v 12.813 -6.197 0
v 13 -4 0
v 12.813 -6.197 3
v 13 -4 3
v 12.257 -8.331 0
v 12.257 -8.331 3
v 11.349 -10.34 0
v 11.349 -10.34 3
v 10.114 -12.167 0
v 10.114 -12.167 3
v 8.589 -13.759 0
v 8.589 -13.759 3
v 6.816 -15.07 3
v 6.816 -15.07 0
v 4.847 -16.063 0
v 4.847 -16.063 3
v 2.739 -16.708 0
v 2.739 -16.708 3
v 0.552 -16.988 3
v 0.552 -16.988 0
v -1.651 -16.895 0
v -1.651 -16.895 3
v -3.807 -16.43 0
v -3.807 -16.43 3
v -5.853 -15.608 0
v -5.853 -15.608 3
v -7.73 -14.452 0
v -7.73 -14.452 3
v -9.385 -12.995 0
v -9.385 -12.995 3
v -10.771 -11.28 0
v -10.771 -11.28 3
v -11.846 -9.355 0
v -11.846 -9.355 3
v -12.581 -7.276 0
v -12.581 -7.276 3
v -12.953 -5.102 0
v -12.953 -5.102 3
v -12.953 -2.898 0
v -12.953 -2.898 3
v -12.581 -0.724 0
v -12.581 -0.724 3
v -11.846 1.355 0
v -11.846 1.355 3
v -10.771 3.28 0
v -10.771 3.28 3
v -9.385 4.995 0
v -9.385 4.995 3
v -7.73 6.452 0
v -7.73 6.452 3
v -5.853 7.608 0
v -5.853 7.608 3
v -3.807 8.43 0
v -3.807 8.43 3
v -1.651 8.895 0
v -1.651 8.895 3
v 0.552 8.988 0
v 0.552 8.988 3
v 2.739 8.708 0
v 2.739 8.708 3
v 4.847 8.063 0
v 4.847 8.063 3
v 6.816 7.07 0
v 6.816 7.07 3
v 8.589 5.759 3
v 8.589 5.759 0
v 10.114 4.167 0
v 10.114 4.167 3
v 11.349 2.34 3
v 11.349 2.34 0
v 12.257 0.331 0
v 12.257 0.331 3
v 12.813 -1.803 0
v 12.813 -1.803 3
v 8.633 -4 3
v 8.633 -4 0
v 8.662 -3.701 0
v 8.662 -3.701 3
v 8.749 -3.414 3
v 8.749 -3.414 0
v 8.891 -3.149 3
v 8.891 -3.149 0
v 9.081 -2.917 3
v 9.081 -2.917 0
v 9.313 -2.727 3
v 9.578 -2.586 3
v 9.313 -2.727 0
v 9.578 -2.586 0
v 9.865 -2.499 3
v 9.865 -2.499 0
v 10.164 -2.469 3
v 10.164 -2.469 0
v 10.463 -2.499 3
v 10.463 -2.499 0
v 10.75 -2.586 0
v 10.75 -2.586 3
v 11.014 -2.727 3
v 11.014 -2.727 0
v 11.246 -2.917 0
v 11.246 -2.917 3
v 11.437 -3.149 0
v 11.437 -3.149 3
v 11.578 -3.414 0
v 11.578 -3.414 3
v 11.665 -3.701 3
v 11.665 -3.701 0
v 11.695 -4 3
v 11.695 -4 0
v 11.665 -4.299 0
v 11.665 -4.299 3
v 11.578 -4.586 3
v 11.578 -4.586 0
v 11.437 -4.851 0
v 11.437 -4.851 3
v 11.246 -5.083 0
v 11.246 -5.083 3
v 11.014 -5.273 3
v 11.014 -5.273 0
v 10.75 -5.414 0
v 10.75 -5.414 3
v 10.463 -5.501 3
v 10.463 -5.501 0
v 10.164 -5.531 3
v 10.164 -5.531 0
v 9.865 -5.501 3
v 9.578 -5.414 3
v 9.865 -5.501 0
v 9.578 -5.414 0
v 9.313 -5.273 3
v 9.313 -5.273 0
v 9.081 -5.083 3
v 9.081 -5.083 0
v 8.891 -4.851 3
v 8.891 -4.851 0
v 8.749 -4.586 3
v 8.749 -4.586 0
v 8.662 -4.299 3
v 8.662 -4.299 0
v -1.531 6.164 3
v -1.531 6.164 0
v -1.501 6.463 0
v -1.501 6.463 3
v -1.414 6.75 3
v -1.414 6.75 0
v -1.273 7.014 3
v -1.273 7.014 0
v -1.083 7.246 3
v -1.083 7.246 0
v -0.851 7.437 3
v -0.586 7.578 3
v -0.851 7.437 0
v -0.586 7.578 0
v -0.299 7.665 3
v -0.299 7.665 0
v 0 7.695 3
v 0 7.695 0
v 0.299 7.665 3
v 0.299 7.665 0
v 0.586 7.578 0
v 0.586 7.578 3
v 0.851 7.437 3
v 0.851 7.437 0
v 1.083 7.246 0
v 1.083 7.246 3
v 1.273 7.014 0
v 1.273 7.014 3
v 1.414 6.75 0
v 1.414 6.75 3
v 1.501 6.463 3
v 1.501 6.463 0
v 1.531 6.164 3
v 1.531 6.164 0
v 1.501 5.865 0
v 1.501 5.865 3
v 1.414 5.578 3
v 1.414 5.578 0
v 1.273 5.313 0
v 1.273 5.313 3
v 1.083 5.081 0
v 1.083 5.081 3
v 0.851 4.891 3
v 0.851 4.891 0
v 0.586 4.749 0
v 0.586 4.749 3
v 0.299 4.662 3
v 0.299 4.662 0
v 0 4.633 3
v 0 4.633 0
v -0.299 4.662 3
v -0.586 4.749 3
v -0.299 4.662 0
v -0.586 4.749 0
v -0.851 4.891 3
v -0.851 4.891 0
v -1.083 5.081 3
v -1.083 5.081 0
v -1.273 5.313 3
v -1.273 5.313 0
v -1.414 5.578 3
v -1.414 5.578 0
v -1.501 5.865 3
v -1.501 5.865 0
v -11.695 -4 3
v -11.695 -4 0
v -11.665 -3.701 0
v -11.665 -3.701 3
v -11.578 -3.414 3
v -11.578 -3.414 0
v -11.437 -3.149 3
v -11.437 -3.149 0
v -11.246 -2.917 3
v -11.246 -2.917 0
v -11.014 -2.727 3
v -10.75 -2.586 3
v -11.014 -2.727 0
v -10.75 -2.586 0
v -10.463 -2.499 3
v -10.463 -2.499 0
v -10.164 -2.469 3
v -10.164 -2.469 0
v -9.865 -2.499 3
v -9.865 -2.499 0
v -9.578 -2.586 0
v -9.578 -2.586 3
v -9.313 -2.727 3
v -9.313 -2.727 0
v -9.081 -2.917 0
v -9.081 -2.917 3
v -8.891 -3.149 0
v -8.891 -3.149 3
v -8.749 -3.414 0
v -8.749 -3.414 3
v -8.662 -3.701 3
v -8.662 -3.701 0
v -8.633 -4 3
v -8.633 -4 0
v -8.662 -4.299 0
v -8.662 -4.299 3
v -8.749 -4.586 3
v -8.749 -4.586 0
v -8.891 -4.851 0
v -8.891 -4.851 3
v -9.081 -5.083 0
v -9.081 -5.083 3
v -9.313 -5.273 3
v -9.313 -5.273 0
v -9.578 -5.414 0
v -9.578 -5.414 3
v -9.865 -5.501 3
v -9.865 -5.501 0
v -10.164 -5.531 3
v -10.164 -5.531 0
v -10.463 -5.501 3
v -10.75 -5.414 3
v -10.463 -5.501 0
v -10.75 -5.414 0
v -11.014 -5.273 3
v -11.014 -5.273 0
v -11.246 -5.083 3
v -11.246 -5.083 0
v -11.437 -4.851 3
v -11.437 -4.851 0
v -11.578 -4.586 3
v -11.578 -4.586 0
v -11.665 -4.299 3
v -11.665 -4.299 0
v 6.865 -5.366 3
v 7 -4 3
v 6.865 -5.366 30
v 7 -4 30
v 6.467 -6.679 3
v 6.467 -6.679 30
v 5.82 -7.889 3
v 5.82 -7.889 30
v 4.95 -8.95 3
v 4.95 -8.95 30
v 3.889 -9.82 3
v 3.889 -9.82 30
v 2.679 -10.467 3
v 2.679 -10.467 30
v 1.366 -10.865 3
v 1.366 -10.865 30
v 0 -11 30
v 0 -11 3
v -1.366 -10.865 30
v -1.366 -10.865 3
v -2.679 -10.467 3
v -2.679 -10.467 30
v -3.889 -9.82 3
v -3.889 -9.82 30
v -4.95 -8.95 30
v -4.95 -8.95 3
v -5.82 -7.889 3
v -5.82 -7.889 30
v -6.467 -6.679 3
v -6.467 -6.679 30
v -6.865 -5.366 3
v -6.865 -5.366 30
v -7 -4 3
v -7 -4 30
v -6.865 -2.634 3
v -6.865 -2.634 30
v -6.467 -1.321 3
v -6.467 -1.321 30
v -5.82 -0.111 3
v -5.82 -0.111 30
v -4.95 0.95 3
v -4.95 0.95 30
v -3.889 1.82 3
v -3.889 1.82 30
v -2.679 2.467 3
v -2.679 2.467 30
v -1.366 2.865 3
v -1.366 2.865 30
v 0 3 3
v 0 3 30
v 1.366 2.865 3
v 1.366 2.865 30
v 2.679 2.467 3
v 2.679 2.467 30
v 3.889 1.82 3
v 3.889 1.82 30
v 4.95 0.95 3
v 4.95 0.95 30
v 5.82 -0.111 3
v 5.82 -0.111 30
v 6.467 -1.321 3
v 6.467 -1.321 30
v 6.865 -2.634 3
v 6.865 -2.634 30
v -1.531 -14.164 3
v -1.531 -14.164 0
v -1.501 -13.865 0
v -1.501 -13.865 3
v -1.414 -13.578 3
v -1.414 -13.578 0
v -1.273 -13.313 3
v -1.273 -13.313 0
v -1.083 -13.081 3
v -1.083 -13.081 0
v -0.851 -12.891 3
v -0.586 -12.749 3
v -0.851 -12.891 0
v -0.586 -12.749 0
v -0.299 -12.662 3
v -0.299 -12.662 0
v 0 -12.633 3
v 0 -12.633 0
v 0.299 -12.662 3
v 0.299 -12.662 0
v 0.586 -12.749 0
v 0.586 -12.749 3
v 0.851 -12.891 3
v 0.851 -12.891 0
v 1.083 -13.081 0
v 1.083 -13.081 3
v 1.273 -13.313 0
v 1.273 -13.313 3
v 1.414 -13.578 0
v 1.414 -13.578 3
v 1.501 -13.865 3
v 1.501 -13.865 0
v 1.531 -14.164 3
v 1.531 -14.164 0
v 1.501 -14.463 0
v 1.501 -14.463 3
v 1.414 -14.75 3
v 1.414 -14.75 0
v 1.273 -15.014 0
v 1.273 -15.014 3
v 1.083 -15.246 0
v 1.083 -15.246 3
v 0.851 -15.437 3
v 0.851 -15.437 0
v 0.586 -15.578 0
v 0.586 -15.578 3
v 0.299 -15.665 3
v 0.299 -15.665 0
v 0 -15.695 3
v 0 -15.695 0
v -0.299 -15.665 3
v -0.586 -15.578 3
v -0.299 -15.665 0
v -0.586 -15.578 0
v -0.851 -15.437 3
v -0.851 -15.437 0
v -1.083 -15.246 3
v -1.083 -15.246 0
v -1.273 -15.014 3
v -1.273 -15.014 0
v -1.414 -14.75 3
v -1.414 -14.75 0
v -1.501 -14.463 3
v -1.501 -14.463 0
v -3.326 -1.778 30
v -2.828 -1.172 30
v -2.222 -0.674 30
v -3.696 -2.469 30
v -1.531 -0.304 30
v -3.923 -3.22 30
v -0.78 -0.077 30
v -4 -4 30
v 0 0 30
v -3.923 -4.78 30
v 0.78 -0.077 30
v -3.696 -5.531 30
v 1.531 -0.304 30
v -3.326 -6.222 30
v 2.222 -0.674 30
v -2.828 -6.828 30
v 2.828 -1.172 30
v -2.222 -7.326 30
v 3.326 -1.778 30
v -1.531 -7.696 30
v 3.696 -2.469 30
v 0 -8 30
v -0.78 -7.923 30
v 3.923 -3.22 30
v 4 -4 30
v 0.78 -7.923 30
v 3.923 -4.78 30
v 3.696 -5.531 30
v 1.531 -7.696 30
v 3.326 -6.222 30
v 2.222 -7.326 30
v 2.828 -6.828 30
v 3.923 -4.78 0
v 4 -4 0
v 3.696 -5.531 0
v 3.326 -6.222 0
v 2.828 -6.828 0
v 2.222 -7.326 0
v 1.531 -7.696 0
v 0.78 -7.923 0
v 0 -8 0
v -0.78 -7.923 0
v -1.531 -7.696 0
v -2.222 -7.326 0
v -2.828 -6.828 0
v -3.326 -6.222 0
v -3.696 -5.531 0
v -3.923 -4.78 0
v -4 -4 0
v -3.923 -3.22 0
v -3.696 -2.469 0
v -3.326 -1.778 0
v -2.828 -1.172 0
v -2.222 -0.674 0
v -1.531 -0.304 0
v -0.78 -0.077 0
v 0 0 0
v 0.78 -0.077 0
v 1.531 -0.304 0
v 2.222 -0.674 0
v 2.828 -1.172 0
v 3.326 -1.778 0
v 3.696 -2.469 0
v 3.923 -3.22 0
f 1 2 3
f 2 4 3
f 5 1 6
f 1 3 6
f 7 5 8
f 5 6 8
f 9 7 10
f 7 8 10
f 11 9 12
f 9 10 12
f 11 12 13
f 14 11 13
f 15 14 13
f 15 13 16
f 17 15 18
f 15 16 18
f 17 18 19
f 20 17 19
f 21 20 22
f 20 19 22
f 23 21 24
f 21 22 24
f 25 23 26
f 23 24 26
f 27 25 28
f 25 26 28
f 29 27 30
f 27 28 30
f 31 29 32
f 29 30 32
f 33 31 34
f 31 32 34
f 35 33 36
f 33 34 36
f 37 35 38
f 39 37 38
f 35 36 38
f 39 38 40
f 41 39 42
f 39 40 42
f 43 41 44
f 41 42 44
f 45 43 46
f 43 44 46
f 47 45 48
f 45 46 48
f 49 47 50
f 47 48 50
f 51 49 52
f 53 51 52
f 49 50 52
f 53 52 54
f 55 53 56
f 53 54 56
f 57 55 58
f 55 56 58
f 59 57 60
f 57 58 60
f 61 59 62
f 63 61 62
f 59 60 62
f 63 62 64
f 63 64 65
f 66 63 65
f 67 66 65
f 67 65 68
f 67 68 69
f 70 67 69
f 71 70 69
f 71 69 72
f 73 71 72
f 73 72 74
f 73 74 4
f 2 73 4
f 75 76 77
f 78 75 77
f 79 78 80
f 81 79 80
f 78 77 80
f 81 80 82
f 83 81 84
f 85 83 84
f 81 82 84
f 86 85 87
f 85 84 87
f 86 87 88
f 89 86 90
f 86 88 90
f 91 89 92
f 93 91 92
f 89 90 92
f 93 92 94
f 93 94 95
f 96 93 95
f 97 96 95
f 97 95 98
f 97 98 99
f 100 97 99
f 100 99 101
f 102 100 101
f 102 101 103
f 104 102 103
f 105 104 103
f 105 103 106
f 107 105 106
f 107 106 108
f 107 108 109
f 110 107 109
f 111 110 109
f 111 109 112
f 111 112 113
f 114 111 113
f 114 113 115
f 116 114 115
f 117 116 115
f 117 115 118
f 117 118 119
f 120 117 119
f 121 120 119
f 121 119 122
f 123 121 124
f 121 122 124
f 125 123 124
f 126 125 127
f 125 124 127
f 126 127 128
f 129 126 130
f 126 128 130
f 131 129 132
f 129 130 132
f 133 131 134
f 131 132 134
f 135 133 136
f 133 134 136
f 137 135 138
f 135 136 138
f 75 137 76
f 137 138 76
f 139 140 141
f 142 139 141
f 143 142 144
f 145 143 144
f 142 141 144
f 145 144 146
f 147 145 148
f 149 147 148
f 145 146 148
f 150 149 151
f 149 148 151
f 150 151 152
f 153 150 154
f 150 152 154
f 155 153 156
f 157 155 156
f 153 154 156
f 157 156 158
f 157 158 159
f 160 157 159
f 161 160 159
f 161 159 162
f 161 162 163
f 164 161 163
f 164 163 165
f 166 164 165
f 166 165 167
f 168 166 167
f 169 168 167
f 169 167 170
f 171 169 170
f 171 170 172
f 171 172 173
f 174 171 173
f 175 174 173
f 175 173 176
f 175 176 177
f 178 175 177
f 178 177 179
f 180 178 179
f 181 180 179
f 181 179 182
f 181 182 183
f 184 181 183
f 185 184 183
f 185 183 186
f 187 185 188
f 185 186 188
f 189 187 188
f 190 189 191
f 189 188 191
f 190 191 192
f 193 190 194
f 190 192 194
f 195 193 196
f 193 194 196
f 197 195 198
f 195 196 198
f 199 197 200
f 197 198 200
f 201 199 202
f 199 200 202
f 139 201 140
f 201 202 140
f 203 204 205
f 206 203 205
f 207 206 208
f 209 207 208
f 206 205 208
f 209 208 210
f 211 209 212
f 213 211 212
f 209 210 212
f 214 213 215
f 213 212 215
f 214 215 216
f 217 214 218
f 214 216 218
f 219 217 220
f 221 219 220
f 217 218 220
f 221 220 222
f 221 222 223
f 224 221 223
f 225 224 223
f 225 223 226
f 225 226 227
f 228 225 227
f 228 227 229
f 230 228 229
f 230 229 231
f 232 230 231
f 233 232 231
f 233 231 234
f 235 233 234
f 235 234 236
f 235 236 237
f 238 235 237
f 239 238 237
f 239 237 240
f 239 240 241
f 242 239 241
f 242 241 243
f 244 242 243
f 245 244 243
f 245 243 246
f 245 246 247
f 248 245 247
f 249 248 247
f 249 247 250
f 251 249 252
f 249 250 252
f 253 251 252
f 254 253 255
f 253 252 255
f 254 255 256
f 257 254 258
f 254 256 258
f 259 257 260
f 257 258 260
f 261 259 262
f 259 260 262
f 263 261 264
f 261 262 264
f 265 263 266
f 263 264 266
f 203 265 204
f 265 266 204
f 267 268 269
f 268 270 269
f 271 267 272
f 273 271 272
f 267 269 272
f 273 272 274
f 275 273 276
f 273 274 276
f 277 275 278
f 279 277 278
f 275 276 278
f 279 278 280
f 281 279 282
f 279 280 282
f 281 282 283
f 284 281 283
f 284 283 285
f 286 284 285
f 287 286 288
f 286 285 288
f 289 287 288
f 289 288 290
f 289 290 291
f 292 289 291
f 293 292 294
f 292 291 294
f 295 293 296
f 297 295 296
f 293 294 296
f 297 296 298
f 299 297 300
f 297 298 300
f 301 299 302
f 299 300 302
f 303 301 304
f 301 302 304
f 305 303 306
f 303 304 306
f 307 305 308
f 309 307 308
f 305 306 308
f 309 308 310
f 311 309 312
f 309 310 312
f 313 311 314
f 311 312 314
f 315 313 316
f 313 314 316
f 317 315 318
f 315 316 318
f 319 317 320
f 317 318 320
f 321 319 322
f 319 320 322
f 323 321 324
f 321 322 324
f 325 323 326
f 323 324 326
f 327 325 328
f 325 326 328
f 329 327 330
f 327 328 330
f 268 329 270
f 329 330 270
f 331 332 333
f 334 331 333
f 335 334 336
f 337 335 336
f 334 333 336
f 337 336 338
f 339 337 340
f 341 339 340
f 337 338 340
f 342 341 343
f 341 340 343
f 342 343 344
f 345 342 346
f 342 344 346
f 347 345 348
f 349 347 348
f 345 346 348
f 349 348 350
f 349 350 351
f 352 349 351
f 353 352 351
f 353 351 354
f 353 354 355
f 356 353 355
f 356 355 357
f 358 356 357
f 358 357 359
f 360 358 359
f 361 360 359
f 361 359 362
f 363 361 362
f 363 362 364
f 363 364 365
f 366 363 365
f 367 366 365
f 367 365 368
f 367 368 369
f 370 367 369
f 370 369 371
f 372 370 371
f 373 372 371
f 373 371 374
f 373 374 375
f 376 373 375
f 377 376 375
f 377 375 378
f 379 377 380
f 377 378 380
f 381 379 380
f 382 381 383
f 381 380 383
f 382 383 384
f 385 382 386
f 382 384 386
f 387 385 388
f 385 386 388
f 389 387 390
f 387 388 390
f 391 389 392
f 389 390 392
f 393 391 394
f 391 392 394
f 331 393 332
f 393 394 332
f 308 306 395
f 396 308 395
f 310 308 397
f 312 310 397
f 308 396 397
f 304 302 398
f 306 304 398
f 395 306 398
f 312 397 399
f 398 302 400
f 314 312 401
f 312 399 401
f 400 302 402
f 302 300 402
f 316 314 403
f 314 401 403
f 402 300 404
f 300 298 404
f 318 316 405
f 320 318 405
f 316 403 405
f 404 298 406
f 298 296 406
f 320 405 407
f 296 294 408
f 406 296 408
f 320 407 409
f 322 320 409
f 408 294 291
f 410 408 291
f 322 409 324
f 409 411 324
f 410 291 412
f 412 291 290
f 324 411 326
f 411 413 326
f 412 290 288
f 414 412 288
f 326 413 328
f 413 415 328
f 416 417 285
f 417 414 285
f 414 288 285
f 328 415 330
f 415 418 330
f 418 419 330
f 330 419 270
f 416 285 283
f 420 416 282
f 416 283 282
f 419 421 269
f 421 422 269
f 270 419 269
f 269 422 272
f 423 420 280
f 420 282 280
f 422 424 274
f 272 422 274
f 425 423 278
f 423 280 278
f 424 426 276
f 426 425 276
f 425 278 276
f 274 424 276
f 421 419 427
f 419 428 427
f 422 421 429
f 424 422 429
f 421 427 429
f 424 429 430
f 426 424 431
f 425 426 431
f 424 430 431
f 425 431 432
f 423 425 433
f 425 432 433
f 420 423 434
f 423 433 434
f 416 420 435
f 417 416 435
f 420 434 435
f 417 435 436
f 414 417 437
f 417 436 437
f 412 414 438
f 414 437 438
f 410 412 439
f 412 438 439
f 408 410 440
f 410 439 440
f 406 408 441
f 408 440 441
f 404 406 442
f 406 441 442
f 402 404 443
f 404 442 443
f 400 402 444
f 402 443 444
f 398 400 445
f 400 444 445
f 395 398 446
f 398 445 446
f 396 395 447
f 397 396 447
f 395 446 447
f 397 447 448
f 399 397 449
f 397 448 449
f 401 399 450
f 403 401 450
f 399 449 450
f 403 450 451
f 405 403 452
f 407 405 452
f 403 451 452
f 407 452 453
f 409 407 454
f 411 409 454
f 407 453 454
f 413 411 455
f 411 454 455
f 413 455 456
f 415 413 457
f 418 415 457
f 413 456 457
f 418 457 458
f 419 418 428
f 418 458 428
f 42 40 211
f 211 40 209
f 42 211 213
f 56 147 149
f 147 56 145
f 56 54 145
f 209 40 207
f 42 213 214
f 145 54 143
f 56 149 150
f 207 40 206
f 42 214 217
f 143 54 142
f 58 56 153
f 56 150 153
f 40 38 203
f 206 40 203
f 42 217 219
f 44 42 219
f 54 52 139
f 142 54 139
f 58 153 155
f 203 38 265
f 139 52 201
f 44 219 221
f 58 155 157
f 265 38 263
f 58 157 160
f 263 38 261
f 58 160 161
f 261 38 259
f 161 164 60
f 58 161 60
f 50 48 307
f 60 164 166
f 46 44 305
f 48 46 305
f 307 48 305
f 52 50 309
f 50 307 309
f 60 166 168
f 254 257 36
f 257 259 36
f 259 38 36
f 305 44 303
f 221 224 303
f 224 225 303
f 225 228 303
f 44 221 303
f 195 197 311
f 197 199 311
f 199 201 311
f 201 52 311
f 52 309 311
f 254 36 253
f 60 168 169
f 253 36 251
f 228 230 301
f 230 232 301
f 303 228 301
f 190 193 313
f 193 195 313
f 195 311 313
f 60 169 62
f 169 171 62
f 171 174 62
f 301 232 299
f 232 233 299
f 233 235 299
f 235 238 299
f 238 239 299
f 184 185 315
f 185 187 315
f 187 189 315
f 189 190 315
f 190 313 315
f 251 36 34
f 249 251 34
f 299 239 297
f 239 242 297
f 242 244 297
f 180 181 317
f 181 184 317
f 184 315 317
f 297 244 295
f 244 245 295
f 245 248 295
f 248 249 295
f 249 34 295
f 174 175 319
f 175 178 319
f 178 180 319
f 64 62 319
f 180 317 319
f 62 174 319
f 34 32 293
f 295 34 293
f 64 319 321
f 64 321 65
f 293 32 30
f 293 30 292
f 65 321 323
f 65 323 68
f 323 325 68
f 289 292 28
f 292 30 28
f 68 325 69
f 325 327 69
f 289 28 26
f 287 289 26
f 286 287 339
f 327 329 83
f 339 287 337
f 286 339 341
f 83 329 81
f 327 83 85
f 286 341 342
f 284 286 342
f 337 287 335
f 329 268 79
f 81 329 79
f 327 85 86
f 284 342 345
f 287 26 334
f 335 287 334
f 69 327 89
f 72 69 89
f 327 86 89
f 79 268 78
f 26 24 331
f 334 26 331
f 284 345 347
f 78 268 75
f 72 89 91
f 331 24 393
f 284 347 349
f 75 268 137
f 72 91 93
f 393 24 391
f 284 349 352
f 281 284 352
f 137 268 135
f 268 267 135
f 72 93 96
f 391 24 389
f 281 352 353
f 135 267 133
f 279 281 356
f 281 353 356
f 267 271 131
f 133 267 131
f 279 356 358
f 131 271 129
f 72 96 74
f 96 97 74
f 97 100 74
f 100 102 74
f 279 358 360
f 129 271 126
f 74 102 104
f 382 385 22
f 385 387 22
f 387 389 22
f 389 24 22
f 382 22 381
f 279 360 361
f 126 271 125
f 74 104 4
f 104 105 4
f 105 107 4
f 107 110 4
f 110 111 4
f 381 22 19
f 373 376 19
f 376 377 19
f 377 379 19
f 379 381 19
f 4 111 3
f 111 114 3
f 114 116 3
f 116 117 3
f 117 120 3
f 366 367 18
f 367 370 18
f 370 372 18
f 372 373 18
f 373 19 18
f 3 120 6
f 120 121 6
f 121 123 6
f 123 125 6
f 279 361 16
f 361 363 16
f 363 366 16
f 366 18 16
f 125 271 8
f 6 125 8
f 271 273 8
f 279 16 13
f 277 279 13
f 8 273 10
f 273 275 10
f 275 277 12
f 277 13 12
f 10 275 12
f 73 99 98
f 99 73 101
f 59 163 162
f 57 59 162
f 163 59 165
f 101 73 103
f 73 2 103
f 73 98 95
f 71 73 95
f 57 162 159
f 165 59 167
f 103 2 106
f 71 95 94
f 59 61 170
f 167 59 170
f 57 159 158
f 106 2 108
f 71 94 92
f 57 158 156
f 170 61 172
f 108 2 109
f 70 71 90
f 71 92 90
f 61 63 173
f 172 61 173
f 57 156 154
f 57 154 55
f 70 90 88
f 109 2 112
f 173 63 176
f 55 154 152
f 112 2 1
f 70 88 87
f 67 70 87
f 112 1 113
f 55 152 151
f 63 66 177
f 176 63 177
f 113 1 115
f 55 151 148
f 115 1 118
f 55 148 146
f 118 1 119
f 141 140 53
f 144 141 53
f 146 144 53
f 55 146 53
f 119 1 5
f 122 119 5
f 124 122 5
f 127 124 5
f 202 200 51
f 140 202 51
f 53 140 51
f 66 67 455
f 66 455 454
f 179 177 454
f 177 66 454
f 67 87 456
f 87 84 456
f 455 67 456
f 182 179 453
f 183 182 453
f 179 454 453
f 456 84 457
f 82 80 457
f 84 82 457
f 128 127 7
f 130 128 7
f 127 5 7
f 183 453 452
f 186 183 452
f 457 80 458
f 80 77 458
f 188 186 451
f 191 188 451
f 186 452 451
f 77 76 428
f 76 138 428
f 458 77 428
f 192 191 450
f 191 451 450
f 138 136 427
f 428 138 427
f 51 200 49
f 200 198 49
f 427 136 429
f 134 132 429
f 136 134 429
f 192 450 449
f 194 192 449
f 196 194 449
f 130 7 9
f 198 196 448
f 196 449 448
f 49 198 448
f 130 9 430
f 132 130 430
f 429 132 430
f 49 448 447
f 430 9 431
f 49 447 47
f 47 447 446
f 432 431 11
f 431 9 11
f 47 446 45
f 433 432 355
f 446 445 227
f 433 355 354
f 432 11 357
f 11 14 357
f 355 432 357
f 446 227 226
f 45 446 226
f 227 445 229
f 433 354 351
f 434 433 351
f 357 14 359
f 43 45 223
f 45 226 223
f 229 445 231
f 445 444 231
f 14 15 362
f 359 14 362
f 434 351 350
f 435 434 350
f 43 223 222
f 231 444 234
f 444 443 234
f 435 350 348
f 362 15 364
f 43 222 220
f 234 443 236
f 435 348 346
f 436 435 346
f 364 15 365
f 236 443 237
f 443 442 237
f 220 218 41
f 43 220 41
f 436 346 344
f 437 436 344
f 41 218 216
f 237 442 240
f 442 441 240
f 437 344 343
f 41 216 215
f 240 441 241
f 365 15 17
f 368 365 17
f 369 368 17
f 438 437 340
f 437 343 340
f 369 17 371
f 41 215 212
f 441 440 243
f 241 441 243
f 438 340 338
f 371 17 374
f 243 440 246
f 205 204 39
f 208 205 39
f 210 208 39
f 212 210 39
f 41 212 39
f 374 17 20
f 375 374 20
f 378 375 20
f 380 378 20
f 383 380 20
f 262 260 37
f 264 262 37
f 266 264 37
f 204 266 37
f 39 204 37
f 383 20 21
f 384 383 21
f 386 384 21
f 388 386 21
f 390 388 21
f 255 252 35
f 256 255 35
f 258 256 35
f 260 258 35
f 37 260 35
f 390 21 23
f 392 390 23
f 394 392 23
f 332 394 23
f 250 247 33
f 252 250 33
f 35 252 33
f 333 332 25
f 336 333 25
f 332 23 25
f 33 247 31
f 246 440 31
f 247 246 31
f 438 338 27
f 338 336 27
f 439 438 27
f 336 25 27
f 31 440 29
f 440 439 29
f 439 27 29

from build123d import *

# Parameters (mm, degrees)
CROQUIS2_R            = 1.530907885
CORTAR_EXTRUIR1_DEPTH = 10


with BuildPart() as part:
    # Croquis1 → Revolución1 (revolve)
    with BuildSketch(Plane(origin=(0, 0, 0), x_dir=(0, 0, -1), z_dir=(1, 0, 0)), mode=Mode.PRIVATE) as revoluci_n1_sk:
        Polygon((0, 0), (0, 9), (-3, 9), (-3, 3), (-30, 3), (-30, 0), align=None)
    revolve(revoluci_n1_sk.sketch.rotate(Axis((0, -4, 49.046153846), (0, 0, -1)), 90), axis=Axis((0, -4, 49.046153846), (0, 0, -1)))

    # Croquis2 → Cortar-Extruir1 (cut)
    with BuildSketch(Plane(origin=(0, 0, 0), x_dir=(-1, 0, 0), z_dir=(0, 0, -1))):
        with Locations((0, 6.163841236)):
            Circle(CROQUIS2_R)
        with Locations((10.163841236, -4)):
            Circle(CROQUIS2_R)
        with Locations((0, -14.163841236)):
            Circle(CROQUIS2_R)
        with Locations((-10.163841236, -4)):
            Circle(CROQUIS2_R)
    extrude(amount=-CORTAR_EXTRUIR1_DEPTH, mode=Mode.SUBTRACT)


solid = part.part
